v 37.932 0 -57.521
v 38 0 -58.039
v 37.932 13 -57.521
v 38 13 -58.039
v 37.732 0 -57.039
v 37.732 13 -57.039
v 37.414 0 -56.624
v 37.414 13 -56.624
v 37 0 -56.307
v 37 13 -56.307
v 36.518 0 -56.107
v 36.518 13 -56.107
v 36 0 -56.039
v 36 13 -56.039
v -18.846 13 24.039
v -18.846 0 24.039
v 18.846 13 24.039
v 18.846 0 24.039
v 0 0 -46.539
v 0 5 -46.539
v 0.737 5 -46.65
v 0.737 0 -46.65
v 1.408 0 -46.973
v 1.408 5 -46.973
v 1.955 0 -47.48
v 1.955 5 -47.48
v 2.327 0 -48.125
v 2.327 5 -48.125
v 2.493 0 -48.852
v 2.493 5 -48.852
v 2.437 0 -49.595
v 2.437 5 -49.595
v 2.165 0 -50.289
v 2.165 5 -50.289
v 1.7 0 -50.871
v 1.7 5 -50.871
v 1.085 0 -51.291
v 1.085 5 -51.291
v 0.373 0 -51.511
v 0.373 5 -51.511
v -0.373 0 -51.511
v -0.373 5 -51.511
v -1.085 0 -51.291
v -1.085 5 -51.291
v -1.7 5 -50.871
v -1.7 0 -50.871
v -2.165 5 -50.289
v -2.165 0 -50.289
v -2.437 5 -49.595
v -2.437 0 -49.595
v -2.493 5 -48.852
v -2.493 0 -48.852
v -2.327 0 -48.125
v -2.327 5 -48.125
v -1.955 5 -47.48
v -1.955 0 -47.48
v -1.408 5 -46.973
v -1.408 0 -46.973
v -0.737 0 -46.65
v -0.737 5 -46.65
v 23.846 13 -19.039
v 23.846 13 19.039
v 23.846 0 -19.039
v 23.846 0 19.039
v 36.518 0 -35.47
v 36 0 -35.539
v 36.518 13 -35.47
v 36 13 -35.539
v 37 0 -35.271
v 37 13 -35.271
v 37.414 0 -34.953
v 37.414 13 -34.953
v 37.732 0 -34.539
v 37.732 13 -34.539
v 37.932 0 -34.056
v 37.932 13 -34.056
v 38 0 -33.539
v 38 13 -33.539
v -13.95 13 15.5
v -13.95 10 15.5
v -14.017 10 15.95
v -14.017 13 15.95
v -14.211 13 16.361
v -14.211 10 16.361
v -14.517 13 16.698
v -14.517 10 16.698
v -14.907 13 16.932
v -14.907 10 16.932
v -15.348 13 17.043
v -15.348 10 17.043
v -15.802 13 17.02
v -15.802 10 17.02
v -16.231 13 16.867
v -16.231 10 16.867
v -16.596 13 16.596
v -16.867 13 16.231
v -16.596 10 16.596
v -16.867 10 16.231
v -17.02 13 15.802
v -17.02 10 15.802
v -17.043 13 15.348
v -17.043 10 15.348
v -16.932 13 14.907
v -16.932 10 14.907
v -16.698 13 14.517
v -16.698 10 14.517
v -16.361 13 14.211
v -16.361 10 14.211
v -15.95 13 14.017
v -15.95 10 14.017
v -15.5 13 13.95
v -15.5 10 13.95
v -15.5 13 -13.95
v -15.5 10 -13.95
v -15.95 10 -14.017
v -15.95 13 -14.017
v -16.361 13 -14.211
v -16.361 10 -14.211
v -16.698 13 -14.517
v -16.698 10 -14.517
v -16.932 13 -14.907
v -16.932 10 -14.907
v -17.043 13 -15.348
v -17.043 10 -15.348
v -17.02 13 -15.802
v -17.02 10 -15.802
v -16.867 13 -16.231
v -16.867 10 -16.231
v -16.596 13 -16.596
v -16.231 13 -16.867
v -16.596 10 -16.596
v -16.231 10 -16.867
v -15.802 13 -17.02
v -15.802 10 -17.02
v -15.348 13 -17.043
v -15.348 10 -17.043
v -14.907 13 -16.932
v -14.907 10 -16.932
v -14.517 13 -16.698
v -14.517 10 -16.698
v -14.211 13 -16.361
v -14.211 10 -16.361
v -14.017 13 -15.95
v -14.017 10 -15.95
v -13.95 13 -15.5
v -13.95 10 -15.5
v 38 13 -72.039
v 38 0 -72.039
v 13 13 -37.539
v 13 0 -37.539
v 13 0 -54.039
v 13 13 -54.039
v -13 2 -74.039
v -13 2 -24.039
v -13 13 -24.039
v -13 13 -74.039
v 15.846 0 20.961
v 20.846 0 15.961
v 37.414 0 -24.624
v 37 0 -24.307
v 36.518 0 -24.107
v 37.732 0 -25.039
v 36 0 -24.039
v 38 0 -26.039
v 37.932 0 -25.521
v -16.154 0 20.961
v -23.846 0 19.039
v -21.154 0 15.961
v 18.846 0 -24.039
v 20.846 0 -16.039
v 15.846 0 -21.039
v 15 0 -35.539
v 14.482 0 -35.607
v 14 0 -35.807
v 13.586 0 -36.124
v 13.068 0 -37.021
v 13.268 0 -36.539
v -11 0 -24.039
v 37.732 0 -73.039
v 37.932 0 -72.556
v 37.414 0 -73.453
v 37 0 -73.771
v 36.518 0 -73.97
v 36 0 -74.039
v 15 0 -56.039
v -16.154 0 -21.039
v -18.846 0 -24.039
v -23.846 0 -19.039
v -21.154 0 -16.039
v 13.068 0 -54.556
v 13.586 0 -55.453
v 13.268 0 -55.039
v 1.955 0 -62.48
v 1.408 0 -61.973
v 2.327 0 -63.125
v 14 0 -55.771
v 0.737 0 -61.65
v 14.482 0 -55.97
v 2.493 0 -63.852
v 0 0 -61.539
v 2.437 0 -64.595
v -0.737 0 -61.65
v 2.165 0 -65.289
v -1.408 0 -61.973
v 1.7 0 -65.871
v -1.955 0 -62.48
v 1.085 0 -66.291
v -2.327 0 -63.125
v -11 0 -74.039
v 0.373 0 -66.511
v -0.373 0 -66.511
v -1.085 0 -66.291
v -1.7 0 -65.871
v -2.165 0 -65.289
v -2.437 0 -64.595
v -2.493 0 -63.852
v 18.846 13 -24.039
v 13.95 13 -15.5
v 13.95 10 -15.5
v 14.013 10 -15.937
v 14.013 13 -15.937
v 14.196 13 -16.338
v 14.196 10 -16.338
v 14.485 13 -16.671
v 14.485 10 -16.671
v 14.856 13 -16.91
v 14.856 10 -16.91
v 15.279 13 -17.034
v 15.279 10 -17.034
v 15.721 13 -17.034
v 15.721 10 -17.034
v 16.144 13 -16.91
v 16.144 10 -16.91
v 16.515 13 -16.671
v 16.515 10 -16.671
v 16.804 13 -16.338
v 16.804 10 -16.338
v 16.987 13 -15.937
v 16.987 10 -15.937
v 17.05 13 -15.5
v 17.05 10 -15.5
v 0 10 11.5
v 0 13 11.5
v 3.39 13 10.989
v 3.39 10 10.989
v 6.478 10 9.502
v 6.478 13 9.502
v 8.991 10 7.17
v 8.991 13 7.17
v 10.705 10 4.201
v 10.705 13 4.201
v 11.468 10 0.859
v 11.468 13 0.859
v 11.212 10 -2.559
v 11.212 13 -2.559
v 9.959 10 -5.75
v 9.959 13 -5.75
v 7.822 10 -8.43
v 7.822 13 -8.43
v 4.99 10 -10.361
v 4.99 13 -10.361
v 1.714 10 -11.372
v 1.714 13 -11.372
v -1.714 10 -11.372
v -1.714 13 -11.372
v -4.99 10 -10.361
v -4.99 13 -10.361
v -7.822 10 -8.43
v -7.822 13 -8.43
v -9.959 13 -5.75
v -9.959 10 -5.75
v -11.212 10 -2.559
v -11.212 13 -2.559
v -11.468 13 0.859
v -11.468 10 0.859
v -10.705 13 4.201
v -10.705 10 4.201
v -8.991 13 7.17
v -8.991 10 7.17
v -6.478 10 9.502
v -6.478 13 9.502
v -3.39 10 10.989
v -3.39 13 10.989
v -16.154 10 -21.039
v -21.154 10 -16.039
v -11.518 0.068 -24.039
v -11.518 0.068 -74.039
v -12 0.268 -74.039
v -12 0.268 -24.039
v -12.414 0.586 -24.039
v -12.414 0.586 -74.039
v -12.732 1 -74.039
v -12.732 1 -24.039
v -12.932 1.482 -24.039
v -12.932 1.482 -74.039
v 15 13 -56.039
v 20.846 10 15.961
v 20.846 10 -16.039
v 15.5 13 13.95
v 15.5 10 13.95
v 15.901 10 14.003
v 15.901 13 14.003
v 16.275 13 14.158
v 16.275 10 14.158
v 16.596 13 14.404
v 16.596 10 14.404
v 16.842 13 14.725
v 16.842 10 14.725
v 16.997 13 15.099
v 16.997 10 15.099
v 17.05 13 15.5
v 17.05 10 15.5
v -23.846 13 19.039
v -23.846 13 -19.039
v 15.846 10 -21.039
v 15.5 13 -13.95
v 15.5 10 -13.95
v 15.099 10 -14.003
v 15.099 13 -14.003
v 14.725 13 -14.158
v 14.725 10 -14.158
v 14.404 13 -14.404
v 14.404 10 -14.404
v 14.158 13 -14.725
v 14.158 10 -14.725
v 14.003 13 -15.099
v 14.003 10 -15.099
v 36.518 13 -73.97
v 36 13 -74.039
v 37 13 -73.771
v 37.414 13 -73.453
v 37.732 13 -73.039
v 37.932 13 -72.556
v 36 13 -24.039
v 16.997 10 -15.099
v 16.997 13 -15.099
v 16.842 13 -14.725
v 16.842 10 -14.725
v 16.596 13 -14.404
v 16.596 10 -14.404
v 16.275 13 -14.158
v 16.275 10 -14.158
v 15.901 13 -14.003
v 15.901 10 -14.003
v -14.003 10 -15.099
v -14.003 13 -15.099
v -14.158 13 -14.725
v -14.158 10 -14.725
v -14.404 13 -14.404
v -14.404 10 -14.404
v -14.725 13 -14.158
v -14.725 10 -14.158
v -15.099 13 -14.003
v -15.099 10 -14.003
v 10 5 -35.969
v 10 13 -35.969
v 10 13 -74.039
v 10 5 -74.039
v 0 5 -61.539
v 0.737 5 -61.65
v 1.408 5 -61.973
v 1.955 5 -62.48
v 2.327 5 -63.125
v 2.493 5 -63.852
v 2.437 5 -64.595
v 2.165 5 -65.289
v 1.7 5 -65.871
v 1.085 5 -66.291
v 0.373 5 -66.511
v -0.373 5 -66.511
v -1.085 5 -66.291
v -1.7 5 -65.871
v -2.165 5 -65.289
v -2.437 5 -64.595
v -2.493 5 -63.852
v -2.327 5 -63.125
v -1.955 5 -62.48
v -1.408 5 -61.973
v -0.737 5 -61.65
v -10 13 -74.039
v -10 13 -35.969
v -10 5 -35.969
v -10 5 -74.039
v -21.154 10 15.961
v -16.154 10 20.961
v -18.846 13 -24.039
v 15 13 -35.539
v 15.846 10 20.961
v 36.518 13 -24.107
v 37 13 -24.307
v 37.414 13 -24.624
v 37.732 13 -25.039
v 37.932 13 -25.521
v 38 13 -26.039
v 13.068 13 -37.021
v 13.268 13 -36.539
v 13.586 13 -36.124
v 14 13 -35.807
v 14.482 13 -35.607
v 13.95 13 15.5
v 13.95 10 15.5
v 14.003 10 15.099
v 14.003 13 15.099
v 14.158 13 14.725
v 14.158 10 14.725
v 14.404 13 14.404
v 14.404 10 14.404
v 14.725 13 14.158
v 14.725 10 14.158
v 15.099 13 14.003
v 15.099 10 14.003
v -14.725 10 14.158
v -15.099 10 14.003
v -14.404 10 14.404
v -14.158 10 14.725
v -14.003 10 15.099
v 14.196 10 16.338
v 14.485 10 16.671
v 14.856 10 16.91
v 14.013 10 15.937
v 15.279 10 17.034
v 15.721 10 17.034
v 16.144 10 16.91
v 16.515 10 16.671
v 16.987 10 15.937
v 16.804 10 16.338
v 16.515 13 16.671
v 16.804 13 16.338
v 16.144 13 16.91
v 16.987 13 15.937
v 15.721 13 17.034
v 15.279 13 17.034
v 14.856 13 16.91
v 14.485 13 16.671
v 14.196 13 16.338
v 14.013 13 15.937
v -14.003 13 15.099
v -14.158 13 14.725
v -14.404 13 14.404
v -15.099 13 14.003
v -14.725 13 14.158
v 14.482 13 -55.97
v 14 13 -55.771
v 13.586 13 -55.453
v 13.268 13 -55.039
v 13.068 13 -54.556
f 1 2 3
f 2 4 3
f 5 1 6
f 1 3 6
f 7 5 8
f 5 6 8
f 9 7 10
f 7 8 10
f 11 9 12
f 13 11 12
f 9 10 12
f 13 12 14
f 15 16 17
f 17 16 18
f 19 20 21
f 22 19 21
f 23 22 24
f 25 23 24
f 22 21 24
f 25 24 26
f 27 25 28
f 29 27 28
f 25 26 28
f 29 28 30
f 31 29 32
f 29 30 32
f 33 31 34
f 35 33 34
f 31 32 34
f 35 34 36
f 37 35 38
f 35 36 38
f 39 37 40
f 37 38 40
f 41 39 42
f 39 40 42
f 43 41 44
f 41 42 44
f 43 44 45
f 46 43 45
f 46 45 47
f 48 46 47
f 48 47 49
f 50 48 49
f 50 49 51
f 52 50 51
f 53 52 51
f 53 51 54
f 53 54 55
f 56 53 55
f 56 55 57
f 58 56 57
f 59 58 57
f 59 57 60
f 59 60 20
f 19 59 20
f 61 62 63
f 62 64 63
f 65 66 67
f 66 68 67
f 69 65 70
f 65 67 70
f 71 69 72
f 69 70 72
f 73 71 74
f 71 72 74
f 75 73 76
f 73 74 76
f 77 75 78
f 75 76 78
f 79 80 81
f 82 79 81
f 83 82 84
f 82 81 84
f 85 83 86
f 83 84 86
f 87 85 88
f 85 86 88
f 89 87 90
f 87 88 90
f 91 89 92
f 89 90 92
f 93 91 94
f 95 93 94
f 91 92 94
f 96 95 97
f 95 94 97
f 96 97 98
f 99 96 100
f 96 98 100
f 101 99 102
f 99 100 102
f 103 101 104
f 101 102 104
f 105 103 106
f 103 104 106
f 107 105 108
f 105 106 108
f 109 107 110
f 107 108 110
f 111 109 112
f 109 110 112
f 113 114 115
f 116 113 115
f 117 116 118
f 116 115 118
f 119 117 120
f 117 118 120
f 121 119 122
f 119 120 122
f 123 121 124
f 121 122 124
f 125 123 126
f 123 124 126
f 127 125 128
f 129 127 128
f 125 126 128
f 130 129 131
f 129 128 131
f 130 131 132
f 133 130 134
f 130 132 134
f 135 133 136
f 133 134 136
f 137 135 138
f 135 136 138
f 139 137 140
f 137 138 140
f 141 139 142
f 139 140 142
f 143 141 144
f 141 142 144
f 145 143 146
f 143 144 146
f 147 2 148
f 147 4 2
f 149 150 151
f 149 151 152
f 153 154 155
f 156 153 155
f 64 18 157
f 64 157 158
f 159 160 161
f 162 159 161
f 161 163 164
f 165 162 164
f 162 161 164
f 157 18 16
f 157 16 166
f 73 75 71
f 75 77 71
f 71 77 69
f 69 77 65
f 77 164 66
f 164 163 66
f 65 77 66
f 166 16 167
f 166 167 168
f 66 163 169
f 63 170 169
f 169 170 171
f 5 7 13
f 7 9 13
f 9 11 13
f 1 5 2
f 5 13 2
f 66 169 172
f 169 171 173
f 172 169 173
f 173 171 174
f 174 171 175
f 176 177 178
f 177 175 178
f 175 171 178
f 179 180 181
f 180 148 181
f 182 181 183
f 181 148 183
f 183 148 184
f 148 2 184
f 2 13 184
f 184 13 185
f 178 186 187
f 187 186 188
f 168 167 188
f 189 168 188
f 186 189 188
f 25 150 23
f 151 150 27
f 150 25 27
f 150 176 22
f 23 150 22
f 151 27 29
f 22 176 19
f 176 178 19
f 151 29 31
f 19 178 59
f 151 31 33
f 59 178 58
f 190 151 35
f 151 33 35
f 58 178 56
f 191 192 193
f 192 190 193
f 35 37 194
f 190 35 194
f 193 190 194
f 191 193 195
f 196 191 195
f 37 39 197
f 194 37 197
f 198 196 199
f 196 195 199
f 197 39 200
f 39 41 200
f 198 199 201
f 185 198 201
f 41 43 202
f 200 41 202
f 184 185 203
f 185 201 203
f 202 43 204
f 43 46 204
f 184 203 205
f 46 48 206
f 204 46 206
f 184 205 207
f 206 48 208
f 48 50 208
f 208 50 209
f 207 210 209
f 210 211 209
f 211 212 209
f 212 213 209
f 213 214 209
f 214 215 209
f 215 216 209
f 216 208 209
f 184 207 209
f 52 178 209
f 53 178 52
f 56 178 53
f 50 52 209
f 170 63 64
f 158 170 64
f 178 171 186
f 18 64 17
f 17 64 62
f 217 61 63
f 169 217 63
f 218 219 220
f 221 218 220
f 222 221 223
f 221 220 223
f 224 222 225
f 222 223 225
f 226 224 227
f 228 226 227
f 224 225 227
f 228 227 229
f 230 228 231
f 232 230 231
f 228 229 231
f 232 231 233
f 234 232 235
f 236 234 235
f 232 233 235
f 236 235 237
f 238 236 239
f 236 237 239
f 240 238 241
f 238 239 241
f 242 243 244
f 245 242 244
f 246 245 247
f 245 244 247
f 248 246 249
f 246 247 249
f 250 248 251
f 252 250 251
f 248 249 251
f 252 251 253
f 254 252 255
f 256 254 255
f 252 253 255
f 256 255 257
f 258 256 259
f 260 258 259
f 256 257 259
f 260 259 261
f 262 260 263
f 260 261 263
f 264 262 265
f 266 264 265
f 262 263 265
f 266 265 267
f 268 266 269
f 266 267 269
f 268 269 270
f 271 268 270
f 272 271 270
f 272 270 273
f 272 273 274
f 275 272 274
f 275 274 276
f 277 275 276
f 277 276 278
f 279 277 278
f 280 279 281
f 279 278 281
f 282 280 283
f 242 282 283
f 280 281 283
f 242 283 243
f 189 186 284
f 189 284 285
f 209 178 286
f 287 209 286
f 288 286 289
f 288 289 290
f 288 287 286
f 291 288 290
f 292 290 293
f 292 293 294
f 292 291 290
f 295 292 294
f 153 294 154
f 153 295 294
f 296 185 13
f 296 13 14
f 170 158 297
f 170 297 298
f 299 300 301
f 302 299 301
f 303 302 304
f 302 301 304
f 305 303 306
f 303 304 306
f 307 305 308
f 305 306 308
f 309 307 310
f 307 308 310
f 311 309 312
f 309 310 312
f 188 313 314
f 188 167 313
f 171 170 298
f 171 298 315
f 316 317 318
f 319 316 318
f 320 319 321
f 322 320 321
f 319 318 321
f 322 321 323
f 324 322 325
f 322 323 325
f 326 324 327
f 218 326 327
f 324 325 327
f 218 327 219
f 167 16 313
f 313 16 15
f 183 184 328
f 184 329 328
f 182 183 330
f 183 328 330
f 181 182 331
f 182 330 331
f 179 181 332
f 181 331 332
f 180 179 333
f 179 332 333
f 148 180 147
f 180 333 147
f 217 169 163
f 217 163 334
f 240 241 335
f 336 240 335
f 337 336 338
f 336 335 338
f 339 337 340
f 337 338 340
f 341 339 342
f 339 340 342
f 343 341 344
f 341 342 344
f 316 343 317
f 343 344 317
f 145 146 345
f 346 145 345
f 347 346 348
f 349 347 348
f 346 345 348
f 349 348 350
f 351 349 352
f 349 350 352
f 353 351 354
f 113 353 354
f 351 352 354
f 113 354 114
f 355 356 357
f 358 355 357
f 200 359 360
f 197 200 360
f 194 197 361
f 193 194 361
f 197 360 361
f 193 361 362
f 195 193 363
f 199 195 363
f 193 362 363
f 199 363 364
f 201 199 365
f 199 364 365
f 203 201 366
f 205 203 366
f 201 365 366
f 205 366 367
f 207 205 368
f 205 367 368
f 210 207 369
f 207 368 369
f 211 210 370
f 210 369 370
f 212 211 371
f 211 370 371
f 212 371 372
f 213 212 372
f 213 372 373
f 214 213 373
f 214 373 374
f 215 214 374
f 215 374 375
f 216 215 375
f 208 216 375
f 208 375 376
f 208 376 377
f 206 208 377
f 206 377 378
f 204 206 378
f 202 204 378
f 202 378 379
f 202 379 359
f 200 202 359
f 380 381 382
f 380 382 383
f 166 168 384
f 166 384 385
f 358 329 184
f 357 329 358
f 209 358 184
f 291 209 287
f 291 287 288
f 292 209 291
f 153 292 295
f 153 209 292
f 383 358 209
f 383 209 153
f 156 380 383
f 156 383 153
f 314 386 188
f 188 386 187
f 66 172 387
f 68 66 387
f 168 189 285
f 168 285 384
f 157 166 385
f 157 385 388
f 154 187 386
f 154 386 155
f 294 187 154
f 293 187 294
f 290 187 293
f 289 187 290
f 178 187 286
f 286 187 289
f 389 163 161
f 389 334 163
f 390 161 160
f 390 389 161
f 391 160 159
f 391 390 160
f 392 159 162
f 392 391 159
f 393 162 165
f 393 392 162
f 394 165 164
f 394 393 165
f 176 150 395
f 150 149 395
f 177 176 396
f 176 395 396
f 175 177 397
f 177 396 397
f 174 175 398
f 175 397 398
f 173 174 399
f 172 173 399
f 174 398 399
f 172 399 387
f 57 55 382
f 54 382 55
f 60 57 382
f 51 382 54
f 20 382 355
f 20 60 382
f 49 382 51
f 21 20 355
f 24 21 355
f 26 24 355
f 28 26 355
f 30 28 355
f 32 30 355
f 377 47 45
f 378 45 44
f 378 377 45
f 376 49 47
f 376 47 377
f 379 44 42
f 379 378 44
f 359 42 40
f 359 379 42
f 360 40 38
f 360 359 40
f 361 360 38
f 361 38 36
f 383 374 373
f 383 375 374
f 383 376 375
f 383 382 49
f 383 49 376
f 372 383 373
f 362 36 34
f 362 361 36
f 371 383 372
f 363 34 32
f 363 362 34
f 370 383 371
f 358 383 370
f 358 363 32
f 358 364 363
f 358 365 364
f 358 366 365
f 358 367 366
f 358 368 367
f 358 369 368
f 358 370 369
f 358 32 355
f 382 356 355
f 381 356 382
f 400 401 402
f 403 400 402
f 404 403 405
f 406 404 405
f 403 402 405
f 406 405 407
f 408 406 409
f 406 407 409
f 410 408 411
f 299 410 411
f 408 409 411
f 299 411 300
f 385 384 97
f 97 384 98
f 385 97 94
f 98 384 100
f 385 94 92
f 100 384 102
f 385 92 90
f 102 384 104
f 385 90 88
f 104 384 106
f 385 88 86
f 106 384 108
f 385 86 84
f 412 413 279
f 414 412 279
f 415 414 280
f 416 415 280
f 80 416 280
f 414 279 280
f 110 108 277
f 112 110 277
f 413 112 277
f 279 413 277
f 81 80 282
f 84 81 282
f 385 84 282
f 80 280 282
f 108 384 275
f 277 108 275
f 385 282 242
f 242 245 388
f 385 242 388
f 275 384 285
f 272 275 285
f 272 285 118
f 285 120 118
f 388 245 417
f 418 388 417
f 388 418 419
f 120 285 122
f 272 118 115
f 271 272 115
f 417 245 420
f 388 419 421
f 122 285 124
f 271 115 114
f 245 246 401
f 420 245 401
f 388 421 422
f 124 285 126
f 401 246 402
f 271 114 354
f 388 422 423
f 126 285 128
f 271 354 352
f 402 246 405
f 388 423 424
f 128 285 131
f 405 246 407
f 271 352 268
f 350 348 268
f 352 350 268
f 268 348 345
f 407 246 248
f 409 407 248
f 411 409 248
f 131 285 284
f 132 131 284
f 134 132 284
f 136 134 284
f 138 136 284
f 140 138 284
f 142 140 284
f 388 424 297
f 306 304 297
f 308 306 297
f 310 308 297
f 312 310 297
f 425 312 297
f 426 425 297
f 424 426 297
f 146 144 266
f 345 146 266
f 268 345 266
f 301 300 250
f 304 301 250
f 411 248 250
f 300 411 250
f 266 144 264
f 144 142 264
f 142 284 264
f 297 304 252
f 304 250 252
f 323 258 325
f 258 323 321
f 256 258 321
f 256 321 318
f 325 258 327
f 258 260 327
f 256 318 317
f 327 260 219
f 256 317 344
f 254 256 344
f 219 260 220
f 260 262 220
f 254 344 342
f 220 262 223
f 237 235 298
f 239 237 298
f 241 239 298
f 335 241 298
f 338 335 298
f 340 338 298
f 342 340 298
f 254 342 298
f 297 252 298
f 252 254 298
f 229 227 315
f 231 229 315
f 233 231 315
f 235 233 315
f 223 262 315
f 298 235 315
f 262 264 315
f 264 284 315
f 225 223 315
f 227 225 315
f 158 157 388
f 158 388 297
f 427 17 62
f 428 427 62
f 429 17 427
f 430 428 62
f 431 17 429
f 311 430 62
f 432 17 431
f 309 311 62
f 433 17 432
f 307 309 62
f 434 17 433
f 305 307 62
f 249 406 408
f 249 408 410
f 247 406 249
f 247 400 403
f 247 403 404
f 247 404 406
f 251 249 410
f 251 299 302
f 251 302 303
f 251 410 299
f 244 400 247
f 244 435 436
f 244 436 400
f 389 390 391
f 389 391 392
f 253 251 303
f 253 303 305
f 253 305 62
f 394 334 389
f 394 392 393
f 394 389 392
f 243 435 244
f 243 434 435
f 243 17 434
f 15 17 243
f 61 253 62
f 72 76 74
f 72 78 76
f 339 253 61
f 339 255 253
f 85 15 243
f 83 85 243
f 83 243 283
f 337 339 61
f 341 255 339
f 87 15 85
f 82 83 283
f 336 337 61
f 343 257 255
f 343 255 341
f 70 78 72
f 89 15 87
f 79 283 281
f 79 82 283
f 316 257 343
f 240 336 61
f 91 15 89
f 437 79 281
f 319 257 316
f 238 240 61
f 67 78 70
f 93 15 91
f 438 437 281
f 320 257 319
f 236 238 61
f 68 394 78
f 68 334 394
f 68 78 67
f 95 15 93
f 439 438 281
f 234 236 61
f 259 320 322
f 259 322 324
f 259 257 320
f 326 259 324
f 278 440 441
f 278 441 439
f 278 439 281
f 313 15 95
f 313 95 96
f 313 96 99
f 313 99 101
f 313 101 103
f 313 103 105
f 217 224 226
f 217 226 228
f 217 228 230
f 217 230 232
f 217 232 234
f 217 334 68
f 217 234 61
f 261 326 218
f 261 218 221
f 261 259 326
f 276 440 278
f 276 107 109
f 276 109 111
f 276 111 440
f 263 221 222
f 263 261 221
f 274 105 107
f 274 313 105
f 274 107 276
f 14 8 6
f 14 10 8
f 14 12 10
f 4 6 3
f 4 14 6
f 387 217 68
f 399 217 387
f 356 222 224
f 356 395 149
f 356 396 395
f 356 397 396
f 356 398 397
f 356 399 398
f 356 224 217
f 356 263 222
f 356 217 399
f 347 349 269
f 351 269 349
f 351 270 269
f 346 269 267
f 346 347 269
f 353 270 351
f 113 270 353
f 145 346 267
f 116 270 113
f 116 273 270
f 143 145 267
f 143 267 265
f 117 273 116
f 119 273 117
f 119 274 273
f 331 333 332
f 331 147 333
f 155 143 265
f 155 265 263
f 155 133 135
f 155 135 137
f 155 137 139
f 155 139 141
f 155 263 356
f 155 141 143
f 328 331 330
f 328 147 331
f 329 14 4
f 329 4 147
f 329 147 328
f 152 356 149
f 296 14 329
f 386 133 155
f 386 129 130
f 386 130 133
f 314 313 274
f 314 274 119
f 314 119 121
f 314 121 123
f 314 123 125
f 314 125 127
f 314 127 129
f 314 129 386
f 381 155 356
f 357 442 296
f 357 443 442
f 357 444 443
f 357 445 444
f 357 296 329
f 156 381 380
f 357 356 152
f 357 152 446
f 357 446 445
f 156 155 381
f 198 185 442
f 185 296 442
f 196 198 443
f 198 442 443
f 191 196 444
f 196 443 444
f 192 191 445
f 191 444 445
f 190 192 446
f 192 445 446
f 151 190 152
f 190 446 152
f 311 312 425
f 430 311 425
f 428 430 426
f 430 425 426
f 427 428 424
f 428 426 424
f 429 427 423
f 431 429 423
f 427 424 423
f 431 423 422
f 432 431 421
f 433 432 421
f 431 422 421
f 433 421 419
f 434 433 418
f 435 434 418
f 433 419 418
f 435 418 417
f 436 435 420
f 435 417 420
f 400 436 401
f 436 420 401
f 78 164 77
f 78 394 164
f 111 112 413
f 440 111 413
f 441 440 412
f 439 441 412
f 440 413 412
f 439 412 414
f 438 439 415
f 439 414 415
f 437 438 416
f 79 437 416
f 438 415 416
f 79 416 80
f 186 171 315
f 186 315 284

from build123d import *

# Parameters (mm, degrees)
SKETCH_1_W          = 47.691438342
SKETCH_1_H          = 48.077140414
EXTRUDE_2_DEPTH     = 10
SKETCH_4_W          = 47.691438342
SKETCH_4_H          = 48.077140414
EXTRUDE_3_DEPTH     = 3
CUT_EXTRUDE_1_DEPTH = 3
SKETCH_6_R          = 11.5
CUT_EXTRUDE_2_DEPTH = 3
CHAMFER_1_SIZE      = 5
SKETCH_7_W          = 26
SKETCH_7_H          = 13
EXTRUDE_4_DEPTH     = 50
SKETCH_8_W          = 20
SKETCH_8_H          = 40
CUT_EXTRUDE_3_DEPTH = 8
SKETCH_9_W          = 20
SKETCH_9_H          = 8
EXTRUDE_5_DEPTH     = 1.93
SKETCH_10_W         = 11.5
SKETCH_10_H         = 13
SKETCH_10_W_2       = 18
EXTRUDE_6_DEPTH     = 25
FILLET_1_R          = 2
SKETCH_11_R         = 2.5
CUT_EXTRUDE_4_DEPTH = 25


with BuildPart() as part:
    # 草图1 → 凸台-拉伸2 (new body)
    with BuildSketch(Plane(origin=(0, 0, 0), x_dir=(1, 0, 0), z_dir=(0, 1, 0))):
        Rectangle(SKETCH_1_W, SKETCH_1_H)
        Polygon((-21.154280829, -15.961429793), (-16.154280829, -20.961429793), (15.845719171, -20.961429793), (20.845719171, -15.961429793), (20.845719171, 16.038570207), (15.845719171, 21.038570207), (-16.154280829, 21.038570207), (-21.154280829, 16.038570207), align=None, mode=Mode.SUBTRACT)
    extrude(amount=EXTRUDE_2_DEPTH)

    # 草图4 → 凸台-拉伸3 (add)
    with BuildSketch(Plane(origin=(0, 10, 0), x_dir=(1, 0, 0), z_dir=(0, 1, 0))):
        Rectangle(SKETCH_4_W, SKETCH_4_H)
    extrude(amount=EXTRUDE_3_DEPTH)

    # 草图5 → 切除-拉伸1 (cut)
    with BuildSketch(Plane.XZ.offset(-10)):
        with BuildLine():
            ThreePointArc((-13.95, -15.5), (-14.403984489, -14.403984489), (-15.5, -13.95))
            Line((-15.5, -13.95), (-15.5, -15.5))
            Line((-15.5, -15.5), (-13.95, -15.5))
        make_face()
        with BuildLine():
            Line((-15.5, -15.5), (-15.5, -13.95))
            ThreePointArc((-15.5, -13.95), (-16.596015511, -16.596015511), (-13.95, -15.5))
            Line((-13.95, -15.5), (-15.5, -15.5))
        make_face()
        with BuildLine():
            ThreePointArc((17.05, -15.5), (16.596015511, -14.403984489), (15.5, -13.95))
            Line((15.5, -13.95), (15.5, -15.5))
            Line((15.5, -15.5), (13.95, -15.5))
            ThreePointArc((13.95, -15.5), (15.5, -17.05), (17.05, -15.5))
        make_face()
        with BuildLine():
            Line((15.5, -15.5), (15.5, -13.95))
            ThreePointArc((15.5, -13.95), (14.403984489, -14.403984489), (13.95, -15.5))
            Line((13.95, -15.5), (15.5, -15.5))
        make_face()
        with BuildLine():
            ThreePointArc((17.05, 15.5), (15.5, 17.05), (13.95, 15.5))
            Line((13.95, 15.5), (15.5, 15.5))
            Line((15.5, 15.5), (15.5, 13.95))
            ThreePointArc((15.5, 13.95), (16.596015511, 14.403984489), (17.05, 15.5))
        make_face()
        with BuildLine():
            Line((15.5, 15.5), (13.95, 15.5))
            ThreePointArc((13.95, 15.5), (14.403984489, 14.403984489), (15.5, 13.95))
            Line((15.5, 13.95), (15.5, 15.5))
        make_face()
        with BuildLine():
            ThreePointArc((-15.5, 13.95), (-14.403984489, 14.403984489), (-13.95, 15.5))
            Line((-13.95, 15.5), (-15.5, 15.5))
            Line((-15.5, 15.5), (-15.5, 13.95))
        make_face()
        with BuildLine():
            Line((-15.5, 15.5), (-13.95, 15.5))
            ThreePointArc((-13.95, 15.5), (-16.596015511, 16.596015511), (-15.5, 13.95))
            Line((-15.5, 13.95), (-15.5, 15.5))
        make_face()
    extrude(amount=-CUT_EXTRUDE_1_DEPTH, mode=Mode.SUBTRACT)

    # 草图6 → 切除-拉伸2 (cut)
    with BuildSketch(Plane(origin=(0, 13, 0), x_dir=(1, 0, 0), z_dir=(0, 1, 0))):
        with Locations(Location((0, 0, 0), (0, 0, 270))):
            Circle(SKETCH_6_R)
    extrude(amount=-CUT_EXTRUDE_2_DEPTH, mode=Mode.SUBTRACT)

    # 倒角1
    chamfer_1_edges = [part.edges().sort_by_distance(p)[0] for p in [
        (23.845719171, 6.5, -24.038570207),
        (23.845719171, 6.5, 24.038570207),
        (-23.845719171, 6.5, 24.038570207),
        (-23.845719171, 6.5, -24.038570207),
    ]]
    chamfer(chamfer_1_edges, length=CHAMFER_1_SIZE)

    # 草图7 → 凸台-拉伸4 (add)
    with BuildSketch(Plane(origin=(0, 0, -24.038570207), x_dir=(-1, 0, 0), z_dir=(0, 0, -1))):
        with Locations((0, 6.5)):
            Rectangle(SKETCH_7_W, SKETCH_7_H)
    extrude(amount=EXTRUDE_4_DEPTH)

    # 草图8 → 切除-拉伸3 (cut)
    with BuildSketch(Plane(origin=(0, 13, 0), x_dir=(1, 0, 0), z_dir=(0, 1, 0))):
        with Locations((0, 54.038570207)):
            Rectangle(SKETCH_8_W, SKETCH_8_H)
    extrude(amount=-CUT_EXTRUDE_3_DEPTH, mode=Mode.SUBTRACT)

    # 草图9 → 凸台-拉伸5 (add)
    with BuildSketch(Plane(origin=(0, 0, -34.038570207), x_dir=(-1, 0, 0), z_dir=(0, 0, -1))):
        with Locations((0, 9)):
            Rectangle(SKETCH_9_W, SKETCH_9_H)
    extrude(amount=EXTRUDE_5_DEPTH)

    # 草图10 → 凸台-拉伸6 (add)
    with BuildSketch(Plane(origin=(13, 0, 0), x_dir=(0, 0, -1), z_dir=(1, 0, 0))):
        with Locations((29.788570207, 6.5)):
            Rectangle(SKETCH_10_W, SKETCH_10_H)
        with Locations((65.038570207, 6.5)):
            Rectangle(SKETCH_10_W_2, SKETCH_10_H)
    extrude(amount=EXTRUDE_6_DEPTH)

    # 圆角1
    fillet_1_edges = [part.edges().sort_by_distance(p)[0] for p in [
        (-13, 0, -49.038570207),
        (13, 6.5, -35.538570207),
        (38, 6.5, -24.038570207),
        (38, 6.5, -35.538570207),
        (13, 6.5, -56.038570207),
        (38, 6.5, -56.038570207),
        (38, 6.5, -74.038570207),
    ]]
    fillet(fillet_1_edges, radius=FILLET_1_R)

    # 草图11 → 切除-拉伸4 (cut)
    with BuildSketch(Plane(origin=(0, 5, 0), x_dir=(1, 0, 0), z_dir=(0, 1, 0))):
        with Locations(Location((0, 64.038570207, 0), (0, 0, 270))):
            Circle(SKETCH_11_R)
        with Locations(Location((0, 49.038570207, 0), (0, 0, 270))):
            Circle(SKETCH_11_R)
    extrude(amount=-CUT_EXTRUDE_4_DEPTH, mode=Mode.SUBTRACT)


solid = part.part
